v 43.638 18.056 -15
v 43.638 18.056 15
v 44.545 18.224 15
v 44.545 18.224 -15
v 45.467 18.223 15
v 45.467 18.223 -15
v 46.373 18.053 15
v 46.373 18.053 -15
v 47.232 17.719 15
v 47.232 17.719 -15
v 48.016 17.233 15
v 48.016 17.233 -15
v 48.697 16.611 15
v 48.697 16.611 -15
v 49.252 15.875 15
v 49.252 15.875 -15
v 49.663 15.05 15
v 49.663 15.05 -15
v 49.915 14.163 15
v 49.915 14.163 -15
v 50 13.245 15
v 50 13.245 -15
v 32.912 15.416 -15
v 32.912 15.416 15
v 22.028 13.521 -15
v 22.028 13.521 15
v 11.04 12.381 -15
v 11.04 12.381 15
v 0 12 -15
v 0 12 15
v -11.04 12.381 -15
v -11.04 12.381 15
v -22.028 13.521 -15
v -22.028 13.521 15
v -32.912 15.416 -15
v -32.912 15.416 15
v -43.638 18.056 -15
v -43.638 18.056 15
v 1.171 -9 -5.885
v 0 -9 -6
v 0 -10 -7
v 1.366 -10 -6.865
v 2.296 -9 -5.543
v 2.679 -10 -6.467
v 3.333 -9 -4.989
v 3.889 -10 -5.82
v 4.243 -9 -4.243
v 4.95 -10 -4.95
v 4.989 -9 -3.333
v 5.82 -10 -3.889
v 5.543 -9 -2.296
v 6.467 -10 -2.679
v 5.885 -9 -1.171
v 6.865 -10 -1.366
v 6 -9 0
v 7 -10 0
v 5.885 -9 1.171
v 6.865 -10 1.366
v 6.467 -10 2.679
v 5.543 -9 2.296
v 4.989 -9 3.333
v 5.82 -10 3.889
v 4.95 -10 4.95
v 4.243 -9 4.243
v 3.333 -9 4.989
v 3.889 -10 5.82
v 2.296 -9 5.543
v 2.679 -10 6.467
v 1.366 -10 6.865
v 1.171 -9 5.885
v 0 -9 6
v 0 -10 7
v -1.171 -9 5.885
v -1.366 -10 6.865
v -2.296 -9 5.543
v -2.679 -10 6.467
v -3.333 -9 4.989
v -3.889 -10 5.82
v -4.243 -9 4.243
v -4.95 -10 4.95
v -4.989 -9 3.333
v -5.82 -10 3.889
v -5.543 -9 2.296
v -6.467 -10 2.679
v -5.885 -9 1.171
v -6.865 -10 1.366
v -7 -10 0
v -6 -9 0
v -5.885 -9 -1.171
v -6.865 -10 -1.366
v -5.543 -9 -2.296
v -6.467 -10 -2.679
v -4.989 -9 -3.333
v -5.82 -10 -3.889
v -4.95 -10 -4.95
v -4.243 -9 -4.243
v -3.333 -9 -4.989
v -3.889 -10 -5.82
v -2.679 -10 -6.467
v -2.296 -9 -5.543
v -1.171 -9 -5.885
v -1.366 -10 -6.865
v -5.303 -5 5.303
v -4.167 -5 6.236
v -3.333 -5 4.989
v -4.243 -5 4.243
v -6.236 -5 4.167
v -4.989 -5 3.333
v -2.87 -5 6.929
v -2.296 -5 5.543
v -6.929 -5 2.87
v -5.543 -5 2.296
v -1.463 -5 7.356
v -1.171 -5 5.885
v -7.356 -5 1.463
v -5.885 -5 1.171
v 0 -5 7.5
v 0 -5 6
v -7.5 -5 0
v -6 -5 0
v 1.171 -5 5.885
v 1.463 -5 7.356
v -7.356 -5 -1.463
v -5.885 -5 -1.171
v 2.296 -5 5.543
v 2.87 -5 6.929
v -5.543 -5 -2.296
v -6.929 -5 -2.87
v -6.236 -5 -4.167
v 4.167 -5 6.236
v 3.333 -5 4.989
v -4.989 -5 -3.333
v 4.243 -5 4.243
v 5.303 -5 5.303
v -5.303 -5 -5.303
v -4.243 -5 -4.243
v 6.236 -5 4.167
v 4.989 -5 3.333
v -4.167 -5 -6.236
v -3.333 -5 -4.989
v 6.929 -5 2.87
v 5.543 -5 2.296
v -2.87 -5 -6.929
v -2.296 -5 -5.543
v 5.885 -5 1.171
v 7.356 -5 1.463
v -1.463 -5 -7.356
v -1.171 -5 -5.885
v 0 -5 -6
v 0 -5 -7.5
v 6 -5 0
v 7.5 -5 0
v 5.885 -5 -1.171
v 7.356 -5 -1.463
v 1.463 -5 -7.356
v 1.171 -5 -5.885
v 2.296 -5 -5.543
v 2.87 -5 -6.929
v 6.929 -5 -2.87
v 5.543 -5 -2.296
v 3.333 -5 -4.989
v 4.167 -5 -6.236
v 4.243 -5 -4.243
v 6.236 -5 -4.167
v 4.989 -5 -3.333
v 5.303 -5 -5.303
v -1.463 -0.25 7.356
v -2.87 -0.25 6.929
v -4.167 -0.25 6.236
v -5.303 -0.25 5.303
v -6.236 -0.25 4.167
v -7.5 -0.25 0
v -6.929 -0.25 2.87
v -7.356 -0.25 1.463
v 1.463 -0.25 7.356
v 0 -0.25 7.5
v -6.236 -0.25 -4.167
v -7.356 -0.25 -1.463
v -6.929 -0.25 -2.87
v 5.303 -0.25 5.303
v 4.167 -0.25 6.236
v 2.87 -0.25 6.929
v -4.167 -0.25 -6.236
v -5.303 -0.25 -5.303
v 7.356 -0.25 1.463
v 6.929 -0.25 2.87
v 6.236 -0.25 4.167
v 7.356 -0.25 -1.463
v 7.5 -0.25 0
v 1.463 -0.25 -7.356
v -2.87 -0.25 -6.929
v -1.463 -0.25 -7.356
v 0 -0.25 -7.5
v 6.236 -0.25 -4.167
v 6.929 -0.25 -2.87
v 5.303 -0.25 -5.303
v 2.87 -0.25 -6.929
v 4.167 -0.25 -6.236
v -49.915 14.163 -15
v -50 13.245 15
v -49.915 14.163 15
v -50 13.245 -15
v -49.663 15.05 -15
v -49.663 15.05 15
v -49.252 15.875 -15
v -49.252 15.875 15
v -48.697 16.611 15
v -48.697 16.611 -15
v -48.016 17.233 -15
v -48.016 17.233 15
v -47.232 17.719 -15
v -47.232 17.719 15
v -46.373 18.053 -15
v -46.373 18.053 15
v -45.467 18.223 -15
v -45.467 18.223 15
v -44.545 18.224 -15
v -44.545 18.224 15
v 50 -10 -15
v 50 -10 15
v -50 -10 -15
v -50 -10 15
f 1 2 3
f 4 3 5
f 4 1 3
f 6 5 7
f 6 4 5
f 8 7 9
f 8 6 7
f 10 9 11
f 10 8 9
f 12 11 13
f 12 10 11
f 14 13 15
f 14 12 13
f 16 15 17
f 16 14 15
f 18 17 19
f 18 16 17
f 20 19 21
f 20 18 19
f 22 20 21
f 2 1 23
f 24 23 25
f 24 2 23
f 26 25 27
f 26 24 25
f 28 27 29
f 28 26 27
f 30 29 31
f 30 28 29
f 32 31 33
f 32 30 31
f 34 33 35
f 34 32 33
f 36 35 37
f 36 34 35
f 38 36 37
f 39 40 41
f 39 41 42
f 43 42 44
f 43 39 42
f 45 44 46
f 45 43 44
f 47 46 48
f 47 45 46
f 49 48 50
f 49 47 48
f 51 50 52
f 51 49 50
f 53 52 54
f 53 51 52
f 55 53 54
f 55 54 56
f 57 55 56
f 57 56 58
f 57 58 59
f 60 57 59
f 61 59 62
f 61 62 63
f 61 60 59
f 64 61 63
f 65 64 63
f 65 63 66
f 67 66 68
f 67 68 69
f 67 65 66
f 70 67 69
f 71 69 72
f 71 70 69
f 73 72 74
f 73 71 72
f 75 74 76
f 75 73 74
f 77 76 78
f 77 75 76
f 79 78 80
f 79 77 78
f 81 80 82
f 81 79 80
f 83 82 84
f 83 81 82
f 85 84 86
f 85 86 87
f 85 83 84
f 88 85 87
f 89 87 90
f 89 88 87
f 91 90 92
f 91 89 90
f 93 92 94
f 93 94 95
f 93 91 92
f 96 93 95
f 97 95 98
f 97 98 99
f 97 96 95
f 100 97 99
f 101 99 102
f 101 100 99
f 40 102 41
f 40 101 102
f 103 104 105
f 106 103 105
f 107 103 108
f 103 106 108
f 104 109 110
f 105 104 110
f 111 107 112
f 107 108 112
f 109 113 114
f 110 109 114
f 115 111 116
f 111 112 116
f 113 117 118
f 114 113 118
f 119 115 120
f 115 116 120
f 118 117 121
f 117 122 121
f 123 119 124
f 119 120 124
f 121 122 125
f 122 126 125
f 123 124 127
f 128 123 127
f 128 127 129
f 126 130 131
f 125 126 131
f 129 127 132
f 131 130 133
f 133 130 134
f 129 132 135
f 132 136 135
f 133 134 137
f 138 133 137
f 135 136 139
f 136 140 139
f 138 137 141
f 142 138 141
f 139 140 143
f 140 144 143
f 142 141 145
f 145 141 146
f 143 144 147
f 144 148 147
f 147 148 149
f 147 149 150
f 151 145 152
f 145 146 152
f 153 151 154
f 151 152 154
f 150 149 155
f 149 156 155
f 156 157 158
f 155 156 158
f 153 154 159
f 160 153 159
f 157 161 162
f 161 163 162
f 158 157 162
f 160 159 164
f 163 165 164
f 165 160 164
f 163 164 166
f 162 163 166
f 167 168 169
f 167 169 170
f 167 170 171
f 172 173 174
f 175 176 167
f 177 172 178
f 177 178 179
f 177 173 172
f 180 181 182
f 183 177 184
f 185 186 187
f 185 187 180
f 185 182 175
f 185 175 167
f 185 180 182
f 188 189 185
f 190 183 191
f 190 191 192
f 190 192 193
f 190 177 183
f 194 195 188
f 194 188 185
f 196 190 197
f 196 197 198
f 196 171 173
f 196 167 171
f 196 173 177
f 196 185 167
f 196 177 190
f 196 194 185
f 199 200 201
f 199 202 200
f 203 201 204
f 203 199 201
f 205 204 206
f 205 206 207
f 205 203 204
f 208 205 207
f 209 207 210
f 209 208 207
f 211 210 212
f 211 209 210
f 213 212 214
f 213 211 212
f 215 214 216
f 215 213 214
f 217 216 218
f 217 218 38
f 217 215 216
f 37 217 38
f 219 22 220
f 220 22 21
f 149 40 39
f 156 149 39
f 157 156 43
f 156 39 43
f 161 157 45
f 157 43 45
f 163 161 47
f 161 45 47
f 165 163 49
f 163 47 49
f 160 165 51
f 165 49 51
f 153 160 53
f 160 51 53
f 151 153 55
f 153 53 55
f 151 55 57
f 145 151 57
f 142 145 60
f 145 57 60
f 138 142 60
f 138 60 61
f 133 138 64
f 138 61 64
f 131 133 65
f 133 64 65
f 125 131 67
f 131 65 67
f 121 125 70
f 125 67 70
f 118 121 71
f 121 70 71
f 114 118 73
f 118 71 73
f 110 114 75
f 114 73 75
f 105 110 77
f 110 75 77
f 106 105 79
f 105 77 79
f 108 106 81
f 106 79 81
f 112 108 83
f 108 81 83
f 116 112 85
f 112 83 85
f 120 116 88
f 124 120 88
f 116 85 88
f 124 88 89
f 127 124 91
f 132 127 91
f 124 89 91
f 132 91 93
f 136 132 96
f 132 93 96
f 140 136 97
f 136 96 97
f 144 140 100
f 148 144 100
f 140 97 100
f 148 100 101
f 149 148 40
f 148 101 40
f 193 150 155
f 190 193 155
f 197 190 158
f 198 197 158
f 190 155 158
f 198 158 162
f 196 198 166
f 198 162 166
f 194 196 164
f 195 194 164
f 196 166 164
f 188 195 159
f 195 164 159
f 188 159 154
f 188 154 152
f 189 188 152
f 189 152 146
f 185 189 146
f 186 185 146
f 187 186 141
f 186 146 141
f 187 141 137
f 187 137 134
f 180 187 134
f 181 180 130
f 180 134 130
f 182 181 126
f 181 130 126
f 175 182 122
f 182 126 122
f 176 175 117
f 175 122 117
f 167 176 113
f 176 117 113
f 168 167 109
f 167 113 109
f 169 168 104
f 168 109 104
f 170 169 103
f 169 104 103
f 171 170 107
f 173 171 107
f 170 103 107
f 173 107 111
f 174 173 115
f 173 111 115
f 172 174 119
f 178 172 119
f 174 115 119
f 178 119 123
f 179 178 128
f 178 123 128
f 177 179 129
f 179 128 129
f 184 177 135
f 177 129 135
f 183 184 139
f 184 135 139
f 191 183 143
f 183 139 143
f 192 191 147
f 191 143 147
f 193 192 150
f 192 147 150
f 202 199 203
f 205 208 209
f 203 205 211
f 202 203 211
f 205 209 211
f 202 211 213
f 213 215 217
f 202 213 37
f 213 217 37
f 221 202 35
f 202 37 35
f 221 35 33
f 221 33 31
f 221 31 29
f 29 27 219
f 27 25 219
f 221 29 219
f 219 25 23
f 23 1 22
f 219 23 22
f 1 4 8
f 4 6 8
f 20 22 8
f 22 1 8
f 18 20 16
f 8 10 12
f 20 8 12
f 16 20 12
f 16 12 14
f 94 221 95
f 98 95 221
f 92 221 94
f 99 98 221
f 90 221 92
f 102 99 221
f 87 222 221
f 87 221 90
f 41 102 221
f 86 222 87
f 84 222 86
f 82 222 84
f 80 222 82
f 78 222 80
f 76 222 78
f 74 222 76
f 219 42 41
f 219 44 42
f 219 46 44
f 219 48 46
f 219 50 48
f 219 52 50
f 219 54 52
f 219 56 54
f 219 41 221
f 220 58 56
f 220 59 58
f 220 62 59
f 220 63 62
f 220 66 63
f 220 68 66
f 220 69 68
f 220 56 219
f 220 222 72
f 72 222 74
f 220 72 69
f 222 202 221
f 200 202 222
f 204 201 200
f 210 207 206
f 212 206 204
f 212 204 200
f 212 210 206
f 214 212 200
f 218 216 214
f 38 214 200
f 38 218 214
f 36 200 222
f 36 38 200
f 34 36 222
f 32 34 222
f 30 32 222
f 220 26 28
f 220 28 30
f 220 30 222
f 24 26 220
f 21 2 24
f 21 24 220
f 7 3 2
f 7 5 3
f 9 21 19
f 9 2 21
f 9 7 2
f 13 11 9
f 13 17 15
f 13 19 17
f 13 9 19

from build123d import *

# Parameters (mm, degrees)
SKETCH1_W           = 100
SKETCH1_H           = 30
BOSS_EXTRUDE1_DEPTH = 20
CUT_EXTRUDE1_DEPTH  = 62.64414003
FILLET1_R           = 5
SKETCH3_W           = 100
SKETCH3_H           = 30
BOSS_EXTRUDE2_DEPTH = 10
SKETCH4_R           = 6
CUT_EXTRUDE2_DEPTH  = 5
SKETCH5_R           = 7.5
CUT_EXTRUDE3_DEPTH  = 4.75
CHAMFER1_SIZE       = 1


with BuildPart() as part:
    # Sketch1 → Boss-Extrude1 (new body)
    with BuildSketch(Plane(origin=(0, 0, 0), x_dir=(1, 0, 0), z_dir=(0, 1, 0))):
        Rectangle(SKETCH1_W, SKETCH1_H)
    extrude(amount=BOSS_EXTRUDE1_DEPTH)

    # Sketch2 → Cut-Extrude1 (cut, through all)
    with BuildSketch(Plane.XY.offset(15)):
        with BuildLine():
            Line((-50, 20), (50, 20))
            ThreePointArc((50, 20), (0, 12), (-50, 20))
        make_face()
    extrude(amount=-CUT_EXTRUDE1_DEPTH, mode=Mode.SUBTRACT)

    # Fillet1
    fillet1_edges = [part.edges().sort_by_distance(p)[0] for p in [
        (-50, 20, 0),
        (50, 20, 0),
    ]]
    fillet(fillet1_edges, radius=FILLET1_R)

    # Sketch3 → Boss-Extrude2 (add)
    with BuildSketch(Plane.XZ):
        Rectangle(SKETCH3_W, SKETCH3_H)
    extrude(amount=BOSS_EXTRUDE2_DEPTH)

    # Sketch4 → Cut-Extrude2 (cut)
    with BuildSketch(Plane.XZ.offset(10)):
        with Locations(Location((0, 0, 0), (0, 0, 270))):
            Circle(SKETCH4_R)
    extrude(amount=-CUT_EXTRUDE2_DEPTH, mode=Mode.SUBTRACT)

    # Sketch5 → Cut-Extrude3 (cut)
    with BuildSketch(Plane.XZ.offset(5)):
        with Locations(Location((0, 0, 0), (0, 0, 270))):
            Circle(SKETCH5_R)
    extrude(amount=-CUT_EXTRUDE3_DEPTH, mode=Mode.SUBTRACT)

    # Chamfer1
    chamfer1_edges = [part.edges().sort_by_distance(p)[0] for p in [
        (0, -10, 6),
    ]]
    chamfer(chamfer1_edges, length=CHAMFER1_SIZE)


solid = part.part
